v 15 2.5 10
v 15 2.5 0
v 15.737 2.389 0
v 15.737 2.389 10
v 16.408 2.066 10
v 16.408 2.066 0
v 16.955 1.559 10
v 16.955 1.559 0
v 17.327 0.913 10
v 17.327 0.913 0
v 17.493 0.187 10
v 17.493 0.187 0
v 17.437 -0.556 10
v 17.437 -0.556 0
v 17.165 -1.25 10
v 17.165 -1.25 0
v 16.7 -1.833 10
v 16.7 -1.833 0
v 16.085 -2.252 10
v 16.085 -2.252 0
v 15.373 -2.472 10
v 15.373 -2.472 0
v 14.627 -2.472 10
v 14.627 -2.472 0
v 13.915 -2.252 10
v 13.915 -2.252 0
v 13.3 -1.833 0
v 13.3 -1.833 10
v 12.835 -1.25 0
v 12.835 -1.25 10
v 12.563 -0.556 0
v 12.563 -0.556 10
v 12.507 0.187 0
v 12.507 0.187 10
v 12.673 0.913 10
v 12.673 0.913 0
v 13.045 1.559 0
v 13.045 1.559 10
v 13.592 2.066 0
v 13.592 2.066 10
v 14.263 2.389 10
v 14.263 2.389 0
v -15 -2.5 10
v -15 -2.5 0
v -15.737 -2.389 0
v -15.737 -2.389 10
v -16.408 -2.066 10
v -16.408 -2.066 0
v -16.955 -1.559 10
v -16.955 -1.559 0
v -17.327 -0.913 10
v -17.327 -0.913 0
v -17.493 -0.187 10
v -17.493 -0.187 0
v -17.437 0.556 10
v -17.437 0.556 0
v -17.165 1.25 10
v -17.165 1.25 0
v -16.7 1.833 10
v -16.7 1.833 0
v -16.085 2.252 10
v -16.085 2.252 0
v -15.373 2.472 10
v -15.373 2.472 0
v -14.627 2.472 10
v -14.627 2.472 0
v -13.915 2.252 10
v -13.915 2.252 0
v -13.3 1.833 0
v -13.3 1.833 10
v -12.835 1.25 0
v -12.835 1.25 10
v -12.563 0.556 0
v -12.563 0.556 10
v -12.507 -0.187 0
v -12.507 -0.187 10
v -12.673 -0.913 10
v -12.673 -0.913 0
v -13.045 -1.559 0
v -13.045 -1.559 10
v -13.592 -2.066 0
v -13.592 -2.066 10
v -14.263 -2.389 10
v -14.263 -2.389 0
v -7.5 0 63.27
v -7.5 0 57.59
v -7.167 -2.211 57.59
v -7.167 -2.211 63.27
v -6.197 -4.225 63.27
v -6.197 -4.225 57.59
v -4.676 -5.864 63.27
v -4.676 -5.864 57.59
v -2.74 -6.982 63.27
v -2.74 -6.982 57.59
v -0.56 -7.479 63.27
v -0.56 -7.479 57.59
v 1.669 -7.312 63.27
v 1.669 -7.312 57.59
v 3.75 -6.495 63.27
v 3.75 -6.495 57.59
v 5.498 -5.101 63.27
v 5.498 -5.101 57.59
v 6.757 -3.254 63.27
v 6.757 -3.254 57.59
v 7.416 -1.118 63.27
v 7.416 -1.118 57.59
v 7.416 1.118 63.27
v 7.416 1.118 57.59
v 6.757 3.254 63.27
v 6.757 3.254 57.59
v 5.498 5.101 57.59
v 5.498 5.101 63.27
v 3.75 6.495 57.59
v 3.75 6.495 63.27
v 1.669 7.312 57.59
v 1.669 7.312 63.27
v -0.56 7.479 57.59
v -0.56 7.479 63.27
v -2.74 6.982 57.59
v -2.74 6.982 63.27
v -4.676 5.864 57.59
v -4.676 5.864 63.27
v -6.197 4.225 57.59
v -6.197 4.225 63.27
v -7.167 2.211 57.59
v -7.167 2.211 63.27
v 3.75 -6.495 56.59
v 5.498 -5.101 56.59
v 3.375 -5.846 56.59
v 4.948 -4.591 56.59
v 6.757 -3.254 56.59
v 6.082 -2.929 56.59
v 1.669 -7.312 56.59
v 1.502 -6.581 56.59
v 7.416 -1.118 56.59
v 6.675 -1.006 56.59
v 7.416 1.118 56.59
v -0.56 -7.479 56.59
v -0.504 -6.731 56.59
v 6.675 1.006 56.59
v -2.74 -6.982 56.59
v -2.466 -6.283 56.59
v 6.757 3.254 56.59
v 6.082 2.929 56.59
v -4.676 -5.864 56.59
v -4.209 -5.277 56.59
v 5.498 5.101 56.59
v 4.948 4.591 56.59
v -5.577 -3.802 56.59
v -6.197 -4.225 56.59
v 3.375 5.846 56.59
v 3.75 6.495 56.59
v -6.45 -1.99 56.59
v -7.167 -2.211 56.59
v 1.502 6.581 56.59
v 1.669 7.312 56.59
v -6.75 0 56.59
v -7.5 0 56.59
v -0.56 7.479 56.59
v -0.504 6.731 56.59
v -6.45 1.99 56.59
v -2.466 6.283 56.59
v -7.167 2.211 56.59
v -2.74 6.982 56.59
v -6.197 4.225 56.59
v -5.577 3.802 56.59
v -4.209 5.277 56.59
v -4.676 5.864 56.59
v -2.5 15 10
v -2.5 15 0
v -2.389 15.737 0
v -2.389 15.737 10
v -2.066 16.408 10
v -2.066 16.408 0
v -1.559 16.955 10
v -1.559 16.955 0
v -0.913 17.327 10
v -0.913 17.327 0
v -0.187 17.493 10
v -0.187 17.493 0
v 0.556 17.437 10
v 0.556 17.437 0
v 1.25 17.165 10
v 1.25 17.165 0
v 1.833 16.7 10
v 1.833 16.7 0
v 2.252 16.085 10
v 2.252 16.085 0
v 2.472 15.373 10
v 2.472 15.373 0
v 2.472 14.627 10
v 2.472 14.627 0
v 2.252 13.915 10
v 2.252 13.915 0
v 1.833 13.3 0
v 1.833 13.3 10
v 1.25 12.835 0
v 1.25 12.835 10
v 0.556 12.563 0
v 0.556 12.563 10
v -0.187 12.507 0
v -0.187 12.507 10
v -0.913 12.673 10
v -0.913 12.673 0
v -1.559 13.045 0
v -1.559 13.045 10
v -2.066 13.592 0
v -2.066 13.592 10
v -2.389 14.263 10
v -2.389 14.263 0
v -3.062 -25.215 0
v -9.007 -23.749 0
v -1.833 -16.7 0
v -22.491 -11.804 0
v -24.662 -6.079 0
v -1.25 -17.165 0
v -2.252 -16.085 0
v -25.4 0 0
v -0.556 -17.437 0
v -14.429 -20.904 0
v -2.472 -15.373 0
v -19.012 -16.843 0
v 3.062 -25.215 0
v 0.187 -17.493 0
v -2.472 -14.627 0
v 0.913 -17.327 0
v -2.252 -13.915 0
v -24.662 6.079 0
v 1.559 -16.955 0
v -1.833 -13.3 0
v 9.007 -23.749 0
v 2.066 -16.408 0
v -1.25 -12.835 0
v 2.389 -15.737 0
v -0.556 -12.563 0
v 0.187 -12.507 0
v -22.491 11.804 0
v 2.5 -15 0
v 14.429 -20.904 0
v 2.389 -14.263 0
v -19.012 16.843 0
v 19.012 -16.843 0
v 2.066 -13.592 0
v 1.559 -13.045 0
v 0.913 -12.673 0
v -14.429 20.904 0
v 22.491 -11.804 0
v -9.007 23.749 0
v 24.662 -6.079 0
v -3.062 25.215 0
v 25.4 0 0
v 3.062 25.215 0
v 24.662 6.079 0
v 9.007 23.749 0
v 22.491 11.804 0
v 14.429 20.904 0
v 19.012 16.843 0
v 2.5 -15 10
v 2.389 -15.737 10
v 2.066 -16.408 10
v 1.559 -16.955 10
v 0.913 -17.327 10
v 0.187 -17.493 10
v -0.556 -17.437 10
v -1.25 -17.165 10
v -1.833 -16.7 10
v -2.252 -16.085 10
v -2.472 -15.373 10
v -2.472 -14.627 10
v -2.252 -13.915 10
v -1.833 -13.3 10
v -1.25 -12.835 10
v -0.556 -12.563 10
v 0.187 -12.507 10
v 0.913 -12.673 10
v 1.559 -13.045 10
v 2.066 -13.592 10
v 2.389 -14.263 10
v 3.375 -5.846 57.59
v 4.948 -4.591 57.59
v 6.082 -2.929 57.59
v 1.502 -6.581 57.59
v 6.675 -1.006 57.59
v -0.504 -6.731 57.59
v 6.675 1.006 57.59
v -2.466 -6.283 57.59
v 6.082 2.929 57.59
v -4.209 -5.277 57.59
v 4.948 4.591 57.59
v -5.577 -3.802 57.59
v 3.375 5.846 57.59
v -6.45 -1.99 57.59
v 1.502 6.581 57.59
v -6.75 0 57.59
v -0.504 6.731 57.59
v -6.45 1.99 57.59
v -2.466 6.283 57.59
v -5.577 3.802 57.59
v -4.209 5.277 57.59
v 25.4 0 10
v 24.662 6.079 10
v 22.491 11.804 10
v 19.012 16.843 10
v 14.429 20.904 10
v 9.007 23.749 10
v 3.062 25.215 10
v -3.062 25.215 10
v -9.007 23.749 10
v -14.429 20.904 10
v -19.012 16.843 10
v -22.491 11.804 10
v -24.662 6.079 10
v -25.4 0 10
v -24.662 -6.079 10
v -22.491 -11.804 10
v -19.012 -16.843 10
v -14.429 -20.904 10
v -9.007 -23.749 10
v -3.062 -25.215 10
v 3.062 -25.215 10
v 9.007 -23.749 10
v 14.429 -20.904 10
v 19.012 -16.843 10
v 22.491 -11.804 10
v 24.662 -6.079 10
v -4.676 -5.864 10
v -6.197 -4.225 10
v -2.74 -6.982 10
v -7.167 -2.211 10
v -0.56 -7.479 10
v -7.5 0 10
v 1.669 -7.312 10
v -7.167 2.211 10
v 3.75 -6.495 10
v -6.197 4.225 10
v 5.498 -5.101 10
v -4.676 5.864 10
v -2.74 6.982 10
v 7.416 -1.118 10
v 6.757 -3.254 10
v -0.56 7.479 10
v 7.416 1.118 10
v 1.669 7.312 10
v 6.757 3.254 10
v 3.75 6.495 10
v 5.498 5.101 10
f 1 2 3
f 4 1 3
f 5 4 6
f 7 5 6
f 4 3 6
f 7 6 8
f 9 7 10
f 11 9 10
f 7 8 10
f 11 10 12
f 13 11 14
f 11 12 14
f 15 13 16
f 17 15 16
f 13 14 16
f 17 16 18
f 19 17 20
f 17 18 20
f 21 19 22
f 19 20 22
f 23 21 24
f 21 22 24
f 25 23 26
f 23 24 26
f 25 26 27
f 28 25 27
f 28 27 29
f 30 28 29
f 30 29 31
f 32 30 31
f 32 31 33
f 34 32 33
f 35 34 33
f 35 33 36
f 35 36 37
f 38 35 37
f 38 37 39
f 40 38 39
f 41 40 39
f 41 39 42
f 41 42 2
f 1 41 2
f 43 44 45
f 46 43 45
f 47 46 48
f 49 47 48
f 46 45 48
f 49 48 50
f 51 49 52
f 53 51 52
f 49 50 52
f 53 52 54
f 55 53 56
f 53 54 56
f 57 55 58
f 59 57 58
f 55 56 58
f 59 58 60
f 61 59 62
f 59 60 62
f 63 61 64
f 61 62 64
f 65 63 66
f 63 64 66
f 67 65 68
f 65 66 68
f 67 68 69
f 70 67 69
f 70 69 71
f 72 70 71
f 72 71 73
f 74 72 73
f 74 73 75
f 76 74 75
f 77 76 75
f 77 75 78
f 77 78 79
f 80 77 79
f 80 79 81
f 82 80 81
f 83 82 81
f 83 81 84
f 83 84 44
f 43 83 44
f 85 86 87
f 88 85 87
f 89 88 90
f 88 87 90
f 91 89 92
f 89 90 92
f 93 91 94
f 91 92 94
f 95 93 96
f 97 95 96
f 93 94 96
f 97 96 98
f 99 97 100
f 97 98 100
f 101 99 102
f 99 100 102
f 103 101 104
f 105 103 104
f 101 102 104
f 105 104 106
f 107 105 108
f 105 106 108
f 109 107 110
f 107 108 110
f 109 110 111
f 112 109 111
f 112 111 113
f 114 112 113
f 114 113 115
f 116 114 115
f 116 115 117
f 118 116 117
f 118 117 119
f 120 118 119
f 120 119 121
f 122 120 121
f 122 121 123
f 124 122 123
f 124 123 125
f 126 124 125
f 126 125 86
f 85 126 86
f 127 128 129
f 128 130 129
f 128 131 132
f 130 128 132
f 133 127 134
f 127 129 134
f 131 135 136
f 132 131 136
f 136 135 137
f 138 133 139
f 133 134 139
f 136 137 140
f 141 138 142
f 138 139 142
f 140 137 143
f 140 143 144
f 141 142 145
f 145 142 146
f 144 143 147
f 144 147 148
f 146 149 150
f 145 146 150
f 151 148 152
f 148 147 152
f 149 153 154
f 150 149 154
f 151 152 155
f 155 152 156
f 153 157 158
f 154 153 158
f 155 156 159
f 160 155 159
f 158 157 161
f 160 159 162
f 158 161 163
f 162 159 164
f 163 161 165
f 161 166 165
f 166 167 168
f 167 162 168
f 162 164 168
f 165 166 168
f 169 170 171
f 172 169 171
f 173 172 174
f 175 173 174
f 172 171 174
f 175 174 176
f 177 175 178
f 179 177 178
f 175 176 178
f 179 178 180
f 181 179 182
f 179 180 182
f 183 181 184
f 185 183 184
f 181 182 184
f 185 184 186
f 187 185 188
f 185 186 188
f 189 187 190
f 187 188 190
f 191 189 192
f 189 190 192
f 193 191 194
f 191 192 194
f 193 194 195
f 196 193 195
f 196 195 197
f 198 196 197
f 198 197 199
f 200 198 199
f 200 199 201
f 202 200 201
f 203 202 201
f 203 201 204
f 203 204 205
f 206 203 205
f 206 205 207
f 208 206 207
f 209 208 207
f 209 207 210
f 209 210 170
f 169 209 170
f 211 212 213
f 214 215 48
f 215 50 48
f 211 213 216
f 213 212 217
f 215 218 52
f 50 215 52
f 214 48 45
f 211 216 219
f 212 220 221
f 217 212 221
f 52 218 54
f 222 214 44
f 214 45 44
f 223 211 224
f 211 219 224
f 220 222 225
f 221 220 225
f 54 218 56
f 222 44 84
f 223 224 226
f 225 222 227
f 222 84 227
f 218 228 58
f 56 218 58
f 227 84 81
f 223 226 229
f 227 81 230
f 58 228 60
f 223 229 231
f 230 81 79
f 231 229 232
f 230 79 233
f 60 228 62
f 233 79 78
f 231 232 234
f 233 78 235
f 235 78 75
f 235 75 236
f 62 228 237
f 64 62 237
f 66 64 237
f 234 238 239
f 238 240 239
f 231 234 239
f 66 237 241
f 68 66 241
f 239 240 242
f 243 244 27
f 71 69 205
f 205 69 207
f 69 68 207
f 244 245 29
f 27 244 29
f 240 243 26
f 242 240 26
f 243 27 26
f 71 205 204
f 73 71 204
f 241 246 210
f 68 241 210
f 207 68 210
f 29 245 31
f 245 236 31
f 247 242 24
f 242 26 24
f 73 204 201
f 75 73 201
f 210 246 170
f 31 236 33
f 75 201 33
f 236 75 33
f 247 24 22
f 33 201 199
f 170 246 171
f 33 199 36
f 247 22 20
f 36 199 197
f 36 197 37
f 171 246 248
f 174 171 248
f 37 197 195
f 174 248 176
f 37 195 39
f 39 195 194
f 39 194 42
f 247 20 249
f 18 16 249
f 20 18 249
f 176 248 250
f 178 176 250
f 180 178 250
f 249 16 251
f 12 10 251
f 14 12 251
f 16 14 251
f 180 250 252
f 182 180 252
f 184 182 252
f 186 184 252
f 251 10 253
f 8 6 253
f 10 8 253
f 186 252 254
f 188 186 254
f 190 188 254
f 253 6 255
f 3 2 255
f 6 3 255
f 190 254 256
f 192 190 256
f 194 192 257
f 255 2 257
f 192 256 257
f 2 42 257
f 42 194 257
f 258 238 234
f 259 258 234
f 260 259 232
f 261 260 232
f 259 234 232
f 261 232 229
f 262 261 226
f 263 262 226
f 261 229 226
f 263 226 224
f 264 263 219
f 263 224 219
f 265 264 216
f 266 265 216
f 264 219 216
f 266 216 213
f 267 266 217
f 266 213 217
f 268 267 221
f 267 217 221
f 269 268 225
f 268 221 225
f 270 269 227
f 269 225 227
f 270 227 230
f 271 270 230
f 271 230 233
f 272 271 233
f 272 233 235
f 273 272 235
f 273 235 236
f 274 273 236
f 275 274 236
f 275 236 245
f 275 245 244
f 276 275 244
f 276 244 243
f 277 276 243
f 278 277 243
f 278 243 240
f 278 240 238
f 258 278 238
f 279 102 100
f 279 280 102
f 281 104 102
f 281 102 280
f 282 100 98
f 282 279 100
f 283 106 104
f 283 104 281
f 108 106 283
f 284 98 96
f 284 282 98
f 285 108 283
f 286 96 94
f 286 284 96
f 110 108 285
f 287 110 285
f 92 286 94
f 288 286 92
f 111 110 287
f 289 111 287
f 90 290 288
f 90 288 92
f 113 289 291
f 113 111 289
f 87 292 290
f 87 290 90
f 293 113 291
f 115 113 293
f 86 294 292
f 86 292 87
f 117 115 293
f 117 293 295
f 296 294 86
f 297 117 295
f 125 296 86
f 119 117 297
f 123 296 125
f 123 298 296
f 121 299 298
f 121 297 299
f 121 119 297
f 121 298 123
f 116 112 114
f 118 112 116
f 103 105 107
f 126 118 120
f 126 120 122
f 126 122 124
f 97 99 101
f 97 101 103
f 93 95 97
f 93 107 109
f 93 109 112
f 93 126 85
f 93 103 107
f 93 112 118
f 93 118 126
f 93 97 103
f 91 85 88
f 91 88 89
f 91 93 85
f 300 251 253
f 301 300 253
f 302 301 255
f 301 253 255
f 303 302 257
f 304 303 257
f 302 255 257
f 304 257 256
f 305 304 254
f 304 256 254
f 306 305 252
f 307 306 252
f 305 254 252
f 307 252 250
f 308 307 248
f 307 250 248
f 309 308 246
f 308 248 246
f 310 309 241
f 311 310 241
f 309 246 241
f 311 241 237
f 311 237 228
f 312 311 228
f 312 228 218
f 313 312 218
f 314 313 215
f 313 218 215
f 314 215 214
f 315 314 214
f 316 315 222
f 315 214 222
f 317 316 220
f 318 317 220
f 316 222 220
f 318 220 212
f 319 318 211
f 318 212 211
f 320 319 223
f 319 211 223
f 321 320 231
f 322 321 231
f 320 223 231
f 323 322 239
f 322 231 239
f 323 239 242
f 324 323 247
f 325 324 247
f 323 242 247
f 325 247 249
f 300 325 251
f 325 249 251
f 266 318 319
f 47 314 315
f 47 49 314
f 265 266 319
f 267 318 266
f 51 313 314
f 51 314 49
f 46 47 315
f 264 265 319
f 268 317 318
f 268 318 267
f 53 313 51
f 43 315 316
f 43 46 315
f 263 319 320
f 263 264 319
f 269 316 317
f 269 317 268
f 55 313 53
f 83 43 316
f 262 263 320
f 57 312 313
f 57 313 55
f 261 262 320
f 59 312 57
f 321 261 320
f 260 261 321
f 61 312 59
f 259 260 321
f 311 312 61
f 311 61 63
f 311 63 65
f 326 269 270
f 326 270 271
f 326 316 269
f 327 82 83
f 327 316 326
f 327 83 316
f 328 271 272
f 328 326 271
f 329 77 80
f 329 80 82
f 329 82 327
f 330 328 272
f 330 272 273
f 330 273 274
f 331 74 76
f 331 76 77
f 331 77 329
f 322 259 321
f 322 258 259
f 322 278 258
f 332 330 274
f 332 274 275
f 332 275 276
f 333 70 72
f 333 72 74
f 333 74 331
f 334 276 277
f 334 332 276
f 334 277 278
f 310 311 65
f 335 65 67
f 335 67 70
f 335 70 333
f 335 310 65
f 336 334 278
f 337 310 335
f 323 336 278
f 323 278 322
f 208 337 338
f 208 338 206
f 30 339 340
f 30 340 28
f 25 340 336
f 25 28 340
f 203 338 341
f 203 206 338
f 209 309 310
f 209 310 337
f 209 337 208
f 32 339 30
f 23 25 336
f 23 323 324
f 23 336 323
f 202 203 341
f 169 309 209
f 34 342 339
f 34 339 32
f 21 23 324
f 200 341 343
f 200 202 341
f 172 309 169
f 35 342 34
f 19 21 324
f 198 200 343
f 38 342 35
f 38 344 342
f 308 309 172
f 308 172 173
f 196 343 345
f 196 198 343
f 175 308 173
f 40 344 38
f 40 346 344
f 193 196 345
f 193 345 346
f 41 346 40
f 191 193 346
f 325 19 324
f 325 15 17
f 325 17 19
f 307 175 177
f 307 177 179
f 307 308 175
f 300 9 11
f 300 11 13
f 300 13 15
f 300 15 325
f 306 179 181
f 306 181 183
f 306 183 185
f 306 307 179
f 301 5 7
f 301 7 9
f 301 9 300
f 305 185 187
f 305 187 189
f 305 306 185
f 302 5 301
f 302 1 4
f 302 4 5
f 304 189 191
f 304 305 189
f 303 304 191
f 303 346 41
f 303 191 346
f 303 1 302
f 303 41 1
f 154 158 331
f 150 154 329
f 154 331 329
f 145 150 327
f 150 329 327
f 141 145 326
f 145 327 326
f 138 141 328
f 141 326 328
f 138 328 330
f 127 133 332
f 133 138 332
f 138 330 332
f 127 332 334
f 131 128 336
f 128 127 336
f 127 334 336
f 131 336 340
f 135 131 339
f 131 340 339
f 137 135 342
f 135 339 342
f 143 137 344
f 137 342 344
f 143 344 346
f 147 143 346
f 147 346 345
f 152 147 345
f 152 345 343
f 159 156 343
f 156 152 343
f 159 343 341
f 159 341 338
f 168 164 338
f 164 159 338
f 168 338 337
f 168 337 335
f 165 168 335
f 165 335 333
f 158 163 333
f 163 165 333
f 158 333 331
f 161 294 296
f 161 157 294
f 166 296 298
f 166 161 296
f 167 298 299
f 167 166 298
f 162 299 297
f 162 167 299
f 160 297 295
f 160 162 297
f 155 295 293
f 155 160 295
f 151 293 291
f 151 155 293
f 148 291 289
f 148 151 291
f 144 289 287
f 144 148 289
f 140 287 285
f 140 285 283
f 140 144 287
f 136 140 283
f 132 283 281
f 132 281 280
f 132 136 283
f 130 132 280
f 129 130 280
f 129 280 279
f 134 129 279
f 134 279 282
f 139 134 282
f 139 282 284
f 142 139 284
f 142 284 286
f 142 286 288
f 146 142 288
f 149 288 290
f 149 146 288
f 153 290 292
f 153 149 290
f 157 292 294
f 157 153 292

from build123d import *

# Parameters (mm, degrees)
SKETCH1_R                   = 25.4
BOSS_EXTRUDE1_DEPTH         = 10
TAP_DRILL_FOR_M6X1_0_TAP1_D = 5
CIRPATTERN1_COUNT           = 4
SKETCH3_R                   = 7.5
BOSS_EXTRUDE2_DEPTH         = 53.27
SKETCH12_W                  = 1.5
SKETCH12_H                  = 1


with BuildPart() as part:
    # Sketch1 → Boss-Extrude1 (new body)
    with BuildSketch(Plane.XY):
        Circle(SKETCH1_R)
    extrude(amount=BOSS_EXTRUDE1_DEPTH)

    # Tap Drill for M6x1.0 Tap1 (through all)
    with Locations(Plane.XY.offset(10)):
        with Locations((0, 15)):
            tap_drill_for_m6x1_0_tap1 = Hole(TAP_DRILL_FOR_M6X1_0_TAP1_D / 2)

    # CirPattern1: Tap Drill for M6x1.0 Tap1 ×4 about axis
    cirpattern1_axis = Axis((0, 0, 0), (0, 0, 1))
    for i in range(1, CIRPATTERN1_COUNT):
        add(tap_drill_for_m6x1_0_tap1.rotate(cirpattern1_axis, i * 360 / CIRPATTERN1_COUNT), mode=Mode.SUBTRACT)

    # Sketch3 → Boss-Extrude2 (add)
    with BuildSketch(Plane.XY.offset(10)):
        with Locations(Location((0, 0, 0), (0, 0, 180))):
            Circle(SKETCH3_R)
    extrude(amount=BOSS_EXTRUDE2_DEPTH)

    # Sketch12 → Cut-Revolve2 (revolve, cut)
    with BuildSketch(Plane(origin=(0, 0, 0), x_dir=(1, 0, 0), z_dir=(0, 1, 0))):
        with Locations((-7.5, -57.09)):
            Rectangle(SKETCH12_W, SKETCH12_H)
    revolve(axis=Axis((0, 0, 63.27), (0, 0, -1)), mode=Mode.SUBTRACT)


solid = part.part
